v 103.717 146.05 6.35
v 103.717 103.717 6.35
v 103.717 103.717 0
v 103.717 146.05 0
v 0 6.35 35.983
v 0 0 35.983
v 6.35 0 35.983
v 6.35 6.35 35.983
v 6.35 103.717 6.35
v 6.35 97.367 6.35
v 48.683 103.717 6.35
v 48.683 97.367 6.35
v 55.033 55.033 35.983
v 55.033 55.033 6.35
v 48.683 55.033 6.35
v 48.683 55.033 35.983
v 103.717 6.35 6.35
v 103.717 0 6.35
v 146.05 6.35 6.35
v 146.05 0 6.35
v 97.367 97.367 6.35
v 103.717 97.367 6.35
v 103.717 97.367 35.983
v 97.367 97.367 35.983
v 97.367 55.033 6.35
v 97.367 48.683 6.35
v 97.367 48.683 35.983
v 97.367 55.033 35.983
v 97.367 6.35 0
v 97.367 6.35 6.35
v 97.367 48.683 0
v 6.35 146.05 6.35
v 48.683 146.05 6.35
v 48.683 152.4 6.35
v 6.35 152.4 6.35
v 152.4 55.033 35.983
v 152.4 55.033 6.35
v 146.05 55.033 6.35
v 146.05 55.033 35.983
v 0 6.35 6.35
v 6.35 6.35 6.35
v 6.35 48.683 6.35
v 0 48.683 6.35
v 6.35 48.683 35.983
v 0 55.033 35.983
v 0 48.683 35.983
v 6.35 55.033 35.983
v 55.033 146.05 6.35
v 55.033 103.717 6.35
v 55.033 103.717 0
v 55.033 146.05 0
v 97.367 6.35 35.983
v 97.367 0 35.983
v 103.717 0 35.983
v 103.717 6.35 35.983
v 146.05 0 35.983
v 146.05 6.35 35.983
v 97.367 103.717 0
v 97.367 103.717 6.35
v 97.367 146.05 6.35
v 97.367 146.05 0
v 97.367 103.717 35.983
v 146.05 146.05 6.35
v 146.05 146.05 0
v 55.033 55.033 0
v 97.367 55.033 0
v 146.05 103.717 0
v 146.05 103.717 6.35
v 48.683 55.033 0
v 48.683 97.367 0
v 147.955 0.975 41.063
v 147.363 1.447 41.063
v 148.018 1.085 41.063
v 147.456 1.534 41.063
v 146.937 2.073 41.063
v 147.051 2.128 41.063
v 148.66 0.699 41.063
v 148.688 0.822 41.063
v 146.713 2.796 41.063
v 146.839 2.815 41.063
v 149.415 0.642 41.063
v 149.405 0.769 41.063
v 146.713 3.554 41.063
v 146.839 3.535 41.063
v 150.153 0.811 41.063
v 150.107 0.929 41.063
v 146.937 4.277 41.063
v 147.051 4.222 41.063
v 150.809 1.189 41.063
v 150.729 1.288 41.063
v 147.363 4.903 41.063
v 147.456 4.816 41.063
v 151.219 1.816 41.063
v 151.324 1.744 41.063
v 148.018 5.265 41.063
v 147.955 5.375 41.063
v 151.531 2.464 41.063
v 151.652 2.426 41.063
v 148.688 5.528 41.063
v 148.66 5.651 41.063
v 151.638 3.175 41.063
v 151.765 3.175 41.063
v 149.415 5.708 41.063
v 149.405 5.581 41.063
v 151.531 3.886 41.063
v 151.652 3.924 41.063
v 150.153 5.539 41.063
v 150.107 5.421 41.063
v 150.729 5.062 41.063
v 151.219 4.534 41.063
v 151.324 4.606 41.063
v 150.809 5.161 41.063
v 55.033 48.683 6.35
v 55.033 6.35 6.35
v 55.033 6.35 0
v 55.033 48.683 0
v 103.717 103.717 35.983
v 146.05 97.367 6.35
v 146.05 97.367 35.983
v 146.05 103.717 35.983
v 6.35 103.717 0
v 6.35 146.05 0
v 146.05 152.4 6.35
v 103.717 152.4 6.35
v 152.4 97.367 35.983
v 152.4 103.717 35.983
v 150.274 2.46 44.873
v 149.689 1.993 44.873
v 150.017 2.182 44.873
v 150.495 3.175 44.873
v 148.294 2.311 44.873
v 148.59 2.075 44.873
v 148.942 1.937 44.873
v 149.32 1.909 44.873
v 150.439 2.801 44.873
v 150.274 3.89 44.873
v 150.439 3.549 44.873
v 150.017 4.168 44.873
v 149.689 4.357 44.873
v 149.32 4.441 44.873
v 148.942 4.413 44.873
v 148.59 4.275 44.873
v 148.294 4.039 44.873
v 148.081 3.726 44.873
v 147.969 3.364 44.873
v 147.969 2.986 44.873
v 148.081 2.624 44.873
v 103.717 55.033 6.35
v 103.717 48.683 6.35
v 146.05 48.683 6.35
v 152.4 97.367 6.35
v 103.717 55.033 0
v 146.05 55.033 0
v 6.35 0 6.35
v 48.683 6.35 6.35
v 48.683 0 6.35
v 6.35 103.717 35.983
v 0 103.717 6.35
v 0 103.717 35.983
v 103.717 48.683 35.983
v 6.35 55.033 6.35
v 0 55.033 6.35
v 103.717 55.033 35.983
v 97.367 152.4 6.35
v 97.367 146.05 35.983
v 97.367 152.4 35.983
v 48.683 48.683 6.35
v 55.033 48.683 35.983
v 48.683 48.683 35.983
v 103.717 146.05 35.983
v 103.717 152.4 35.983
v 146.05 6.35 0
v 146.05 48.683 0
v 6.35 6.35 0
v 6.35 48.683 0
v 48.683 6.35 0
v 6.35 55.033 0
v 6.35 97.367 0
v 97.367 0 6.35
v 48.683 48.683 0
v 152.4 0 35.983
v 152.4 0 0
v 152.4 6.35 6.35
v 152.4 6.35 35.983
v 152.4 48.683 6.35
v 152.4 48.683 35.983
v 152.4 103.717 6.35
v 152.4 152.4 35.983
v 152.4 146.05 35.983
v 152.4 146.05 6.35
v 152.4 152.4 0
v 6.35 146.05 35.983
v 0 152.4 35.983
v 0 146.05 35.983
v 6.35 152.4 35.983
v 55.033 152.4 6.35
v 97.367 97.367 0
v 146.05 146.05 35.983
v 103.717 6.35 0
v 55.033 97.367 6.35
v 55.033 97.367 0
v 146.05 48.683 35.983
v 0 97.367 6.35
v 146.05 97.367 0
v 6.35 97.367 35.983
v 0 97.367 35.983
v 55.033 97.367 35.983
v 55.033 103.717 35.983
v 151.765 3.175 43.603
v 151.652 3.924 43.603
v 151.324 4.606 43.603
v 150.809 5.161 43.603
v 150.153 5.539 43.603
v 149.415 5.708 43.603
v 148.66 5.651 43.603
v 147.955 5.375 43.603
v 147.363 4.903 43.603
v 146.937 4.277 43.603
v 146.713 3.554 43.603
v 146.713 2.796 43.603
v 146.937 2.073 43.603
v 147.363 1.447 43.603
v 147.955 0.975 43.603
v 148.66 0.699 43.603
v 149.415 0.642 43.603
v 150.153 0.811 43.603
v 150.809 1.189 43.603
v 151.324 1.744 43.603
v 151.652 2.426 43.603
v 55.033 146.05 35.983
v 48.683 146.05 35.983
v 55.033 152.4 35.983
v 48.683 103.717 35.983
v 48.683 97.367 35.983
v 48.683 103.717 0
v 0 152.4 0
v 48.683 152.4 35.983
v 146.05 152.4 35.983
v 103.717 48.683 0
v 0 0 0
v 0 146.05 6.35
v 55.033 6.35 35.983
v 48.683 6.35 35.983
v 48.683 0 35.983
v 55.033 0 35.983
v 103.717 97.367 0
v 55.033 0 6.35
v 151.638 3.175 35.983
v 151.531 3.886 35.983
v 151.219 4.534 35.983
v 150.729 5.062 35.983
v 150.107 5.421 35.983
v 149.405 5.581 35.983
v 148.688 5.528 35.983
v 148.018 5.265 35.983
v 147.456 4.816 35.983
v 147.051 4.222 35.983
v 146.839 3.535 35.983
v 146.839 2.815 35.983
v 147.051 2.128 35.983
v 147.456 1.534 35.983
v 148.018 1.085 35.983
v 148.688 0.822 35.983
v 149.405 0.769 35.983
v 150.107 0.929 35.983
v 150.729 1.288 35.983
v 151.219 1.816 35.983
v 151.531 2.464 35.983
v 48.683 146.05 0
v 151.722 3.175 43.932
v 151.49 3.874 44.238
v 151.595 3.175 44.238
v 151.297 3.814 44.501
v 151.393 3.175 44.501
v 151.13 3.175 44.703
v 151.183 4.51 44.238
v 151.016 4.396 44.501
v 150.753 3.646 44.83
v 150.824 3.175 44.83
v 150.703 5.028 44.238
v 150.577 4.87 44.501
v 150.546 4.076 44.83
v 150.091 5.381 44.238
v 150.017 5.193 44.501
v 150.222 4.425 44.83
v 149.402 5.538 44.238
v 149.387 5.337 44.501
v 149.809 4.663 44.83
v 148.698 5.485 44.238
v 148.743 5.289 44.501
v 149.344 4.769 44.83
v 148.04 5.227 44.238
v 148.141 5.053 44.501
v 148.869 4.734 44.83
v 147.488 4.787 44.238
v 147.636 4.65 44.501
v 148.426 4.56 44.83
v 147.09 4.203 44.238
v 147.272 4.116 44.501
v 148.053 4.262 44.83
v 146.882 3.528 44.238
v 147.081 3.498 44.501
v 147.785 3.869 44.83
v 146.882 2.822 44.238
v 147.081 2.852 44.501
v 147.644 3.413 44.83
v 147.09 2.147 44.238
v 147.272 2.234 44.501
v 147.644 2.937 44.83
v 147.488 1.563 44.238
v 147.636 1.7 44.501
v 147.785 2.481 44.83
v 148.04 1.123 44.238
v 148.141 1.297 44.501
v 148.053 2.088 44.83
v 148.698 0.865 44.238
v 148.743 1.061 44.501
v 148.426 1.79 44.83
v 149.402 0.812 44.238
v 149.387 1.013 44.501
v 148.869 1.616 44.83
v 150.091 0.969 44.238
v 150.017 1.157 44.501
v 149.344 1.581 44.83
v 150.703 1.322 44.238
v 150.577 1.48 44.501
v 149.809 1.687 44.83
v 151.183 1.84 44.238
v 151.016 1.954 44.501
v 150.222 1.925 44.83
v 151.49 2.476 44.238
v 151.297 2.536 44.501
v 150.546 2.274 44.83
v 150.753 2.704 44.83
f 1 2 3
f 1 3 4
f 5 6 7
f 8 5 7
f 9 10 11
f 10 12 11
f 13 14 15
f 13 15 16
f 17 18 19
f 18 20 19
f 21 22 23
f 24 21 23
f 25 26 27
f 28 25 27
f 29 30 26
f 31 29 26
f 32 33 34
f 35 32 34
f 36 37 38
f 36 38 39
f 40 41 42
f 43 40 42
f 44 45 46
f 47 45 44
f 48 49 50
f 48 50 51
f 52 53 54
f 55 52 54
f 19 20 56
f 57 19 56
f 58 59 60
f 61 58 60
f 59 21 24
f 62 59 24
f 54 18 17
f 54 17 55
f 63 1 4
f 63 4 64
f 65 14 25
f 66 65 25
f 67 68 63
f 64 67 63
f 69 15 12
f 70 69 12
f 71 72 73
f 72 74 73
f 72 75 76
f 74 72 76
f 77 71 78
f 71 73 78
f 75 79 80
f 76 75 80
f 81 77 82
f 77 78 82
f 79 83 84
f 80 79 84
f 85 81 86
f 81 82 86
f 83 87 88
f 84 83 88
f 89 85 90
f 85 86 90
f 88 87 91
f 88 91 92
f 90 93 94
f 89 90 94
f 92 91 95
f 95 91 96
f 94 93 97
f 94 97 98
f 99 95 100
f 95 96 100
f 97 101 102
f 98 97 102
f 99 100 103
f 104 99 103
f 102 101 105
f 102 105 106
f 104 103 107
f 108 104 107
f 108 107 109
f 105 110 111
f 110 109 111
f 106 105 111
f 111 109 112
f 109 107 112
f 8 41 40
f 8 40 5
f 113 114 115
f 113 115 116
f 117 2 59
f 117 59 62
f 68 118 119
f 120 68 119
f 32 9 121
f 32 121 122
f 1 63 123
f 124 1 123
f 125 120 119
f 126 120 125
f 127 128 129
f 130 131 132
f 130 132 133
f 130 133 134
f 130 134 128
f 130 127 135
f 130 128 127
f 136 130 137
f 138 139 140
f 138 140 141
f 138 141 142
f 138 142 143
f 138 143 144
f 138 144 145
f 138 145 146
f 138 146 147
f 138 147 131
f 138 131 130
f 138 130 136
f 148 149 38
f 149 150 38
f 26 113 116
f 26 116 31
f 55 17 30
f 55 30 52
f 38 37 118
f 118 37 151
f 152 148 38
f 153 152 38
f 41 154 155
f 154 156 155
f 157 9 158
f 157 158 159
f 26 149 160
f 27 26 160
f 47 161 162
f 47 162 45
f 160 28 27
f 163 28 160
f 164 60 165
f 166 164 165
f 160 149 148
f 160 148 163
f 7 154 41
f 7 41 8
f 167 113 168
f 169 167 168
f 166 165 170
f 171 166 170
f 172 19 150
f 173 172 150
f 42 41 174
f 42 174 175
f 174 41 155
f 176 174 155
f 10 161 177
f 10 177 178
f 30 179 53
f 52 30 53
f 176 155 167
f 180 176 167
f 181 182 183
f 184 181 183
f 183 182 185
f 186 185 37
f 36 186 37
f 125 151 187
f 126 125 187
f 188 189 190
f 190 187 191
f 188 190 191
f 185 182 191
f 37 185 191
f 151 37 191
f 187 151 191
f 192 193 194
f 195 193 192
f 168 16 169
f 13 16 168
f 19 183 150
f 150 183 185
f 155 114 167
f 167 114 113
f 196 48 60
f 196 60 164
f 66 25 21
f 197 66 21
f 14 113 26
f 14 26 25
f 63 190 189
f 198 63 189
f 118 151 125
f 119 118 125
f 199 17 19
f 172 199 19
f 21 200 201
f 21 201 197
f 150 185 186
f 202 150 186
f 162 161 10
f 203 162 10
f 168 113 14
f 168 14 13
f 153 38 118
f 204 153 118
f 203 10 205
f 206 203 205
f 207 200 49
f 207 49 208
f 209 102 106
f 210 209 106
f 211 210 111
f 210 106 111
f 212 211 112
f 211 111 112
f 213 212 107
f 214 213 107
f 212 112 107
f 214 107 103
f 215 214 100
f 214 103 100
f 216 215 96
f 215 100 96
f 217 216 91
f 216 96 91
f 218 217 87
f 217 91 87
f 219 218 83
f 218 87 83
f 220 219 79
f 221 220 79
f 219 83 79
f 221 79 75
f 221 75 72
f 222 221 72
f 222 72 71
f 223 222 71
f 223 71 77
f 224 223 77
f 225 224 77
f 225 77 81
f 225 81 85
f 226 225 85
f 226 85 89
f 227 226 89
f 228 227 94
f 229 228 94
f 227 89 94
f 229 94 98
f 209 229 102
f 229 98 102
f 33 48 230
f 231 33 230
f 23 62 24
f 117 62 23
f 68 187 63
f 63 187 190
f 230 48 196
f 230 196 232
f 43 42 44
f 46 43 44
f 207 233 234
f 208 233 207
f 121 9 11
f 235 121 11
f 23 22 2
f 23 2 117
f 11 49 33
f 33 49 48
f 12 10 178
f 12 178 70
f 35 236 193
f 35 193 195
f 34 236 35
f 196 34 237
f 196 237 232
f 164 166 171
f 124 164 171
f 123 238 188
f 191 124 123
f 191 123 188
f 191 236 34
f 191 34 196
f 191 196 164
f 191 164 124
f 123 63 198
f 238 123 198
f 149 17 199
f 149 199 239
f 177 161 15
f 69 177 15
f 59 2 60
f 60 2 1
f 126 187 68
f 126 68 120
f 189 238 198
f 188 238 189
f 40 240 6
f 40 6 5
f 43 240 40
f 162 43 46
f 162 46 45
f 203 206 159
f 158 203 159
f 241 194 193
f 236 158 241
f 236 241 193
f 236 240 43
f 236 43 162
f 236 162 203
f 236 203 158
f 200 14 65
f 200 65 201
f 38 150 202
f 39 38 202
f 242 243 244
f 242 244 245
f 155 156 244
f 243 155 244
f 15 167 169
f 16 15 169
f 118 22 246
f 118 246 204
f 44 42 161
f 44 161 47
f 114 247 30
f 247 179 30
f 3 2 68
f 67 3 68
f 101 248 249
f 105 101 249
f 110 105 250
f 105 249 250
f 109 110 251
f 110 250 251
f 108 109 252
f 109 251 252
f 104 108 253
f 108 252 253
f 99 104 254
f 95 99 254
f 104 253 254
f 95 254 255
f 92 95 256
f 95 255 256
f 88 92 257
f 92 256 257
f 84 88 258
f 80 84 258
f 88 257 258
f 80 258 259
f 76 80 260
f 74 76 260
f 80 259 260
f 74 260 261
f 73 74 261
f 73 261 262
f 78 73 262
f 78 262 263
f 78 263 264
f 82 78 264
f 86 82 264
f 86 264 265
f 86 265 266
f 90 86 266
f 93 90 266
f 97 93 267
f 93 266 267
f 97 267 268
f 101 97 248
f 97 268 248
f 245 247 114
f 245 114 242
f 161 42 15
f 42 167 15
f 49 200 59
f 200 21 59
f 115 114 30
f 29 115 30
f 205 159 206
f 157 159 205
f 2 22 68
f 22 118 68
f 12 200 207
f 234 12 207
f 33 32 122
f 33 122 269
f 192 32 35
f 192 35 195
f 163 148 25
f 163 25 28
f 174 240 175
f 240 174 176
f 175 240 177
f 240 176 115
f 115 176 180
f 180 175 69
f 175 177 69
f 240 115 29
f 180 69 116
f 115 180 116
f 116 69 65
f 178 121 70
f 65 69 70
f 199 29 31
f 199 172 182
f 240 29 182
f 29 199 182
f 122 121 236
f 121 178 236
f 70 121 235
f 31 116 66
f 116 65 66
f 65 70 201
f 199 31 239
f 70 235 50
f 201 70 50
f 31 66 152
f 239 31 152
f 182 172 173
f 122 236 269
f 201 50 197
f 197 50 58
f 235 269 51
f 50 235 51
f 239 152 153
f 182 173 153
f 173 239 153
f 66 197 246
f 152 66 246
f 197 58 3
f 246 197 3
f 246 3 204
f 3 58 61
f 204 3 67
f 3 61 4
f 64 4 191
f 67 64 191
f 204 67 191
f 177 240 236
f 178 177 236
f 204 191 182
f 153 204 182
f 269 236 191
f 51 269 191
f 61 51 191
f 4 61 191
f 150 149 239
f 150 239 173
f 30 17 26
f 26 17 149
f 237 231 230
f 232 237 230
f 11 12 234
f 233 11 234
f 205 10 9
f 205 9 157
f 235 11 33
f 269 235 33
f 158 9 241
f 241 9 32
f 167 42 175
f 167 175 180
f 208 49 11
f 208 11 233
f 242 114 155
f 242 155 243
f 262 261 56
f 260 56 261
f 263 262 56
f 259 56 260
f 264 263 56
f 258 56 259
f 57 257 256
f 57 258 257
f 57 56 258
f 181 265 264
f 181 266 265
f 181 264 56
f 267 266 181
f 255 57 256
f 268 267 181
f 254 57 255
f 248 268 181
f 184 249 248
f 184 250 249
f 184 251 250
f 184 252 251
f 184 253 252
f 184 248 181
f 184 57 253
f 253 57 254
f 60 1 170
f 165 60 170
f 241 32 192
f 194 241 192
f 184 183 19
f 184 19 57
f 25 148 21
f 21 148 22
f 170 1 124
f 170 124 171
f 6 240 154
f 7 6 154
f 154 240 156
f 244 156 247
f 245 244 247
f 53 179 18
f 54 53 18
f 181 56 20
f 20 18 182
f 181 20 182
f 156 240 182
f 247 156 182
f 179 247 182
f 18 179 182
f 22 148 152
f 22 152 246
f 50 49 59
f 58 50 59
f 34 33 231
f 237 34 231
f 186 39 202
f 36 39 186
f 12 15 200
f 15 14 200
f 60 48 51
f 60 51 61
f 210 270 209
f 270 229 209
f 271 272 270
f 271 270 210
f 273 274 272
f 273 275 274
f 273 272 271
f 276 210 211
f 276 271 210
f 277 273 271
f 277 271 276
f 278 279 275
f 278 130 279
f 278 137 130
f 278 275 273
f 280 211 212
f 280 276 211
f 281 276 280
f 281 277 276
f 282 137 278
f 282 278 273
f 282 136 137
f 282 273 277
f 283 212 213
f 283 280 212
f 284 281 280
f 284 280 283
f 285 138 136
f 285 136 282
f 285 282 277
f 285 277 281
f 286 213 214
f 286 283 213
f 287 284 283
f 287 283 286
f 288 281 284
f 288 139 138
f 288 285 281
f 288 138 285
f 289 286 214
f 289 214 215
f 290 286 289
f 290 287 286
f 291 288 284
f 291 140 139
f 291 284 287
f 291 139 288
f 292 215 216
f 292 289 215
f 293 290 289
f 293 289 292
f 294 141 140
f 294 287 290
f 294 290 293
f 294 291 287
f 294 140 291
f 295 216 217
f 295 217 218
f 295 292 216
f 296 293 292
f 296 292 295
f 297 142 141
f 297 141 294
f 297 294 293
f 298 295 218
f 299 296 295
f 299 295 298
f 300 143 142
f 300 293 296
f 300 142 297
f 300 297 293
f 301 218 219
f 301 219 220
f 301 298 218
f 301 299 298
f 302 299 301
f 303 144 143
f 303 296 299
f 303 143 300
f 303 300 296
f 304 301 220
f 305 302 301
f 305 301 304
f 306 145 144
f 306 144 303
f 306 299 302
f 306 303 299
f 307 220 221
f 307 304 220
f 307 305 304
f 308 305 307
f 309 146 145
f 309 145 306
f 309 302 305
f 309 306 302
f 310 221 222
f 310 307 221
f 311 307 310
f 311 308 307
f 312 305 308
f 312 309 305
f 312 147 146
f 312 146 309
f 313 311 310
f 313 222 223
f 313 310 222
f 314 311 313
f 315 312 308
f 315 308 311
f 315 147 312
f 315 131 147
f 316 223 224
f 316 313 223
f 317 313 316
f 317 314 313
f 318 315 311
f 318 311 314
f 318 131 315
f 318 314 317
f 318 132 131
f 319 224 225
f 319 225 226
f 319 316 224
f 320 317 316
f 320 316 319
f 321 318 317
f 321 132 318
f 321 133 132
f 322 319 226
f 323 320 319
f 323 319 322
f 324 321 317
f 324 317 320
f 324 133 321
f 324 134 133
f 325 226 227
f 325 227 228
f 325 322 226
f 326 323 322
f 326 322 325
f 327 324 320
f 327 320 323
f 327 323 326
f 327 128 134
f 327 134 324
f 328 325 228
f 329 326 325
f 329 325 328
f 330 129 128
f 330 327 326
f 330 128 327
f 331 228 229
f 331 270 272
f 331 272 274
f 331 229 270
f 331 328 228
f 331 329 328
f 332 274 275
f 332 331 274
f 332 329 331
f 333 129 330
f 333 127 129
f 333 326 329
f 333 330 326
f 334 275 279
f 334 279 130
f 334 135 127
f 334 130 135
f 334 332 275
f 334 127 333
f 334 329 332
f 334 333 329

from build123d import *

# Parameters (mm, degrees)
F0_W      = 152.4
F0_H      = 152.4
F1_DEPTH  = 35.9833333333
F2_W      = 42.3333333333
F2_H      = 29.6333333333
F3_DEPTH  = 396.24
F4_W      = 42.3333333333
F4_H      = 29.6333333333
F5_DEPTH  = 206.248
F6_W      = 42.3333333333
F6_H      = 42.3333333333
F7_DEPTH  = 25.4
F8_R      = 2.413
F9_DEPTH  = 5.08
F10_R     = 2.54
F11_DEPTH = 3.81
F12_R     = 1.27


with BuildPart() as f1:
    # F0 (on Top) → F1 (new body)
    with BuildSketch(Plane.XY):
        with Locations((76.2, 76.2)):
            Rectangle(F0_W, F0_H)
    extrude(amount=F1_DEPTH)

    # F2 (on face) → F3 (cut)
    with BuildSketch(Plane.XZ):
        with Locations((27.5166666667, 21.1666666667)):
            Rectangle(F2_W, F2_H)
        with Locations((76.2, 21.1666666667)):
            Rectangle(F2_W, F2_H)
        with Locations((124.8833333333, 21.1666666667)):
            Rectangle(F2_W, F2_H)
    extrude(amount=-F3_DEPTH, mode=Mode.SUBTRACT)

    # F4 (on face) → F5 (cut)
    with BuildSketch(Plane.YZ.offset(152.4)):
        with Locations((27.5166666667, 21.1666666667)):
            Rectangle(F4_W, F4_H)
        with Locations((76.2, 21.1666666667)):
            Rectangle(F4_W, F4_H)
        with Locations((124.8833333333, 21.1666666667)):
            Rectangle(F4_W, F4_H)
    extrude(amount=-F5_DEPTH, mode=Mode.SUBTRACT)

    # F6 (on face) → F7 (cut)
    with BuildSketch(Plane.XY.offset(6.35)):
        with Locations((27.5166666667, 124.8833333333)):
            Rectangle(F6_W, F6_H)
        with Locations((76.2, 124.8833333333)):
            Rectangle(F6_W, F6_H)
        with Locations((124.8833333333, 124.8833333333)):
            Rectangle(F6_W, F6_H)
        with Locations((27.5166666667, 76.2)):
            Rectangle(F6_W, F6_H)
        with Locations((76.2, 76.2)):
            Rectangle(F6_W, F6_H)
        with Locations((124.8833333333, 76.2)):
            Rectangle(F6_W, F6_H)
        with Locations((27.5166666667, 27.5166666667)):
            Rectangle(F6_W, F6_H)
        with Locations((76.2, 27.5166666667)):
            Rectangle(F6_W, F6_H)
        with Locations((124.8833333333, 27.5166666667)):
            Rectangle(F6_W, F6_H)
    extrude(amount=-F7_DEPTH, mode=Mode.SUBTRACT)

    # F8 (on face) → F9 (join)
    with BuildSketch(Plane.XY.offset(35.9833333333)):
        with Locations((149.225, 3.175)):
            Circle(F8_R)
    extrude(amount=F9_DEPTH)

    # F10 (on face) → F11 (join)
    with BuildSketch(Plane.XY.offset(41.0633333333)):
        with Locations((149.225, 3.175)):
            Circle(F10_R)
    extrude(amount=F11_DEPTH)

    # F12
    f12_edges = [f1.edges().sort_by_distance(p)[0] for p in [
        (146.685, 3.175, 44.873333),
    ]]
    fillet(f12_edges, radius=F12_R)


solid = f1.part
